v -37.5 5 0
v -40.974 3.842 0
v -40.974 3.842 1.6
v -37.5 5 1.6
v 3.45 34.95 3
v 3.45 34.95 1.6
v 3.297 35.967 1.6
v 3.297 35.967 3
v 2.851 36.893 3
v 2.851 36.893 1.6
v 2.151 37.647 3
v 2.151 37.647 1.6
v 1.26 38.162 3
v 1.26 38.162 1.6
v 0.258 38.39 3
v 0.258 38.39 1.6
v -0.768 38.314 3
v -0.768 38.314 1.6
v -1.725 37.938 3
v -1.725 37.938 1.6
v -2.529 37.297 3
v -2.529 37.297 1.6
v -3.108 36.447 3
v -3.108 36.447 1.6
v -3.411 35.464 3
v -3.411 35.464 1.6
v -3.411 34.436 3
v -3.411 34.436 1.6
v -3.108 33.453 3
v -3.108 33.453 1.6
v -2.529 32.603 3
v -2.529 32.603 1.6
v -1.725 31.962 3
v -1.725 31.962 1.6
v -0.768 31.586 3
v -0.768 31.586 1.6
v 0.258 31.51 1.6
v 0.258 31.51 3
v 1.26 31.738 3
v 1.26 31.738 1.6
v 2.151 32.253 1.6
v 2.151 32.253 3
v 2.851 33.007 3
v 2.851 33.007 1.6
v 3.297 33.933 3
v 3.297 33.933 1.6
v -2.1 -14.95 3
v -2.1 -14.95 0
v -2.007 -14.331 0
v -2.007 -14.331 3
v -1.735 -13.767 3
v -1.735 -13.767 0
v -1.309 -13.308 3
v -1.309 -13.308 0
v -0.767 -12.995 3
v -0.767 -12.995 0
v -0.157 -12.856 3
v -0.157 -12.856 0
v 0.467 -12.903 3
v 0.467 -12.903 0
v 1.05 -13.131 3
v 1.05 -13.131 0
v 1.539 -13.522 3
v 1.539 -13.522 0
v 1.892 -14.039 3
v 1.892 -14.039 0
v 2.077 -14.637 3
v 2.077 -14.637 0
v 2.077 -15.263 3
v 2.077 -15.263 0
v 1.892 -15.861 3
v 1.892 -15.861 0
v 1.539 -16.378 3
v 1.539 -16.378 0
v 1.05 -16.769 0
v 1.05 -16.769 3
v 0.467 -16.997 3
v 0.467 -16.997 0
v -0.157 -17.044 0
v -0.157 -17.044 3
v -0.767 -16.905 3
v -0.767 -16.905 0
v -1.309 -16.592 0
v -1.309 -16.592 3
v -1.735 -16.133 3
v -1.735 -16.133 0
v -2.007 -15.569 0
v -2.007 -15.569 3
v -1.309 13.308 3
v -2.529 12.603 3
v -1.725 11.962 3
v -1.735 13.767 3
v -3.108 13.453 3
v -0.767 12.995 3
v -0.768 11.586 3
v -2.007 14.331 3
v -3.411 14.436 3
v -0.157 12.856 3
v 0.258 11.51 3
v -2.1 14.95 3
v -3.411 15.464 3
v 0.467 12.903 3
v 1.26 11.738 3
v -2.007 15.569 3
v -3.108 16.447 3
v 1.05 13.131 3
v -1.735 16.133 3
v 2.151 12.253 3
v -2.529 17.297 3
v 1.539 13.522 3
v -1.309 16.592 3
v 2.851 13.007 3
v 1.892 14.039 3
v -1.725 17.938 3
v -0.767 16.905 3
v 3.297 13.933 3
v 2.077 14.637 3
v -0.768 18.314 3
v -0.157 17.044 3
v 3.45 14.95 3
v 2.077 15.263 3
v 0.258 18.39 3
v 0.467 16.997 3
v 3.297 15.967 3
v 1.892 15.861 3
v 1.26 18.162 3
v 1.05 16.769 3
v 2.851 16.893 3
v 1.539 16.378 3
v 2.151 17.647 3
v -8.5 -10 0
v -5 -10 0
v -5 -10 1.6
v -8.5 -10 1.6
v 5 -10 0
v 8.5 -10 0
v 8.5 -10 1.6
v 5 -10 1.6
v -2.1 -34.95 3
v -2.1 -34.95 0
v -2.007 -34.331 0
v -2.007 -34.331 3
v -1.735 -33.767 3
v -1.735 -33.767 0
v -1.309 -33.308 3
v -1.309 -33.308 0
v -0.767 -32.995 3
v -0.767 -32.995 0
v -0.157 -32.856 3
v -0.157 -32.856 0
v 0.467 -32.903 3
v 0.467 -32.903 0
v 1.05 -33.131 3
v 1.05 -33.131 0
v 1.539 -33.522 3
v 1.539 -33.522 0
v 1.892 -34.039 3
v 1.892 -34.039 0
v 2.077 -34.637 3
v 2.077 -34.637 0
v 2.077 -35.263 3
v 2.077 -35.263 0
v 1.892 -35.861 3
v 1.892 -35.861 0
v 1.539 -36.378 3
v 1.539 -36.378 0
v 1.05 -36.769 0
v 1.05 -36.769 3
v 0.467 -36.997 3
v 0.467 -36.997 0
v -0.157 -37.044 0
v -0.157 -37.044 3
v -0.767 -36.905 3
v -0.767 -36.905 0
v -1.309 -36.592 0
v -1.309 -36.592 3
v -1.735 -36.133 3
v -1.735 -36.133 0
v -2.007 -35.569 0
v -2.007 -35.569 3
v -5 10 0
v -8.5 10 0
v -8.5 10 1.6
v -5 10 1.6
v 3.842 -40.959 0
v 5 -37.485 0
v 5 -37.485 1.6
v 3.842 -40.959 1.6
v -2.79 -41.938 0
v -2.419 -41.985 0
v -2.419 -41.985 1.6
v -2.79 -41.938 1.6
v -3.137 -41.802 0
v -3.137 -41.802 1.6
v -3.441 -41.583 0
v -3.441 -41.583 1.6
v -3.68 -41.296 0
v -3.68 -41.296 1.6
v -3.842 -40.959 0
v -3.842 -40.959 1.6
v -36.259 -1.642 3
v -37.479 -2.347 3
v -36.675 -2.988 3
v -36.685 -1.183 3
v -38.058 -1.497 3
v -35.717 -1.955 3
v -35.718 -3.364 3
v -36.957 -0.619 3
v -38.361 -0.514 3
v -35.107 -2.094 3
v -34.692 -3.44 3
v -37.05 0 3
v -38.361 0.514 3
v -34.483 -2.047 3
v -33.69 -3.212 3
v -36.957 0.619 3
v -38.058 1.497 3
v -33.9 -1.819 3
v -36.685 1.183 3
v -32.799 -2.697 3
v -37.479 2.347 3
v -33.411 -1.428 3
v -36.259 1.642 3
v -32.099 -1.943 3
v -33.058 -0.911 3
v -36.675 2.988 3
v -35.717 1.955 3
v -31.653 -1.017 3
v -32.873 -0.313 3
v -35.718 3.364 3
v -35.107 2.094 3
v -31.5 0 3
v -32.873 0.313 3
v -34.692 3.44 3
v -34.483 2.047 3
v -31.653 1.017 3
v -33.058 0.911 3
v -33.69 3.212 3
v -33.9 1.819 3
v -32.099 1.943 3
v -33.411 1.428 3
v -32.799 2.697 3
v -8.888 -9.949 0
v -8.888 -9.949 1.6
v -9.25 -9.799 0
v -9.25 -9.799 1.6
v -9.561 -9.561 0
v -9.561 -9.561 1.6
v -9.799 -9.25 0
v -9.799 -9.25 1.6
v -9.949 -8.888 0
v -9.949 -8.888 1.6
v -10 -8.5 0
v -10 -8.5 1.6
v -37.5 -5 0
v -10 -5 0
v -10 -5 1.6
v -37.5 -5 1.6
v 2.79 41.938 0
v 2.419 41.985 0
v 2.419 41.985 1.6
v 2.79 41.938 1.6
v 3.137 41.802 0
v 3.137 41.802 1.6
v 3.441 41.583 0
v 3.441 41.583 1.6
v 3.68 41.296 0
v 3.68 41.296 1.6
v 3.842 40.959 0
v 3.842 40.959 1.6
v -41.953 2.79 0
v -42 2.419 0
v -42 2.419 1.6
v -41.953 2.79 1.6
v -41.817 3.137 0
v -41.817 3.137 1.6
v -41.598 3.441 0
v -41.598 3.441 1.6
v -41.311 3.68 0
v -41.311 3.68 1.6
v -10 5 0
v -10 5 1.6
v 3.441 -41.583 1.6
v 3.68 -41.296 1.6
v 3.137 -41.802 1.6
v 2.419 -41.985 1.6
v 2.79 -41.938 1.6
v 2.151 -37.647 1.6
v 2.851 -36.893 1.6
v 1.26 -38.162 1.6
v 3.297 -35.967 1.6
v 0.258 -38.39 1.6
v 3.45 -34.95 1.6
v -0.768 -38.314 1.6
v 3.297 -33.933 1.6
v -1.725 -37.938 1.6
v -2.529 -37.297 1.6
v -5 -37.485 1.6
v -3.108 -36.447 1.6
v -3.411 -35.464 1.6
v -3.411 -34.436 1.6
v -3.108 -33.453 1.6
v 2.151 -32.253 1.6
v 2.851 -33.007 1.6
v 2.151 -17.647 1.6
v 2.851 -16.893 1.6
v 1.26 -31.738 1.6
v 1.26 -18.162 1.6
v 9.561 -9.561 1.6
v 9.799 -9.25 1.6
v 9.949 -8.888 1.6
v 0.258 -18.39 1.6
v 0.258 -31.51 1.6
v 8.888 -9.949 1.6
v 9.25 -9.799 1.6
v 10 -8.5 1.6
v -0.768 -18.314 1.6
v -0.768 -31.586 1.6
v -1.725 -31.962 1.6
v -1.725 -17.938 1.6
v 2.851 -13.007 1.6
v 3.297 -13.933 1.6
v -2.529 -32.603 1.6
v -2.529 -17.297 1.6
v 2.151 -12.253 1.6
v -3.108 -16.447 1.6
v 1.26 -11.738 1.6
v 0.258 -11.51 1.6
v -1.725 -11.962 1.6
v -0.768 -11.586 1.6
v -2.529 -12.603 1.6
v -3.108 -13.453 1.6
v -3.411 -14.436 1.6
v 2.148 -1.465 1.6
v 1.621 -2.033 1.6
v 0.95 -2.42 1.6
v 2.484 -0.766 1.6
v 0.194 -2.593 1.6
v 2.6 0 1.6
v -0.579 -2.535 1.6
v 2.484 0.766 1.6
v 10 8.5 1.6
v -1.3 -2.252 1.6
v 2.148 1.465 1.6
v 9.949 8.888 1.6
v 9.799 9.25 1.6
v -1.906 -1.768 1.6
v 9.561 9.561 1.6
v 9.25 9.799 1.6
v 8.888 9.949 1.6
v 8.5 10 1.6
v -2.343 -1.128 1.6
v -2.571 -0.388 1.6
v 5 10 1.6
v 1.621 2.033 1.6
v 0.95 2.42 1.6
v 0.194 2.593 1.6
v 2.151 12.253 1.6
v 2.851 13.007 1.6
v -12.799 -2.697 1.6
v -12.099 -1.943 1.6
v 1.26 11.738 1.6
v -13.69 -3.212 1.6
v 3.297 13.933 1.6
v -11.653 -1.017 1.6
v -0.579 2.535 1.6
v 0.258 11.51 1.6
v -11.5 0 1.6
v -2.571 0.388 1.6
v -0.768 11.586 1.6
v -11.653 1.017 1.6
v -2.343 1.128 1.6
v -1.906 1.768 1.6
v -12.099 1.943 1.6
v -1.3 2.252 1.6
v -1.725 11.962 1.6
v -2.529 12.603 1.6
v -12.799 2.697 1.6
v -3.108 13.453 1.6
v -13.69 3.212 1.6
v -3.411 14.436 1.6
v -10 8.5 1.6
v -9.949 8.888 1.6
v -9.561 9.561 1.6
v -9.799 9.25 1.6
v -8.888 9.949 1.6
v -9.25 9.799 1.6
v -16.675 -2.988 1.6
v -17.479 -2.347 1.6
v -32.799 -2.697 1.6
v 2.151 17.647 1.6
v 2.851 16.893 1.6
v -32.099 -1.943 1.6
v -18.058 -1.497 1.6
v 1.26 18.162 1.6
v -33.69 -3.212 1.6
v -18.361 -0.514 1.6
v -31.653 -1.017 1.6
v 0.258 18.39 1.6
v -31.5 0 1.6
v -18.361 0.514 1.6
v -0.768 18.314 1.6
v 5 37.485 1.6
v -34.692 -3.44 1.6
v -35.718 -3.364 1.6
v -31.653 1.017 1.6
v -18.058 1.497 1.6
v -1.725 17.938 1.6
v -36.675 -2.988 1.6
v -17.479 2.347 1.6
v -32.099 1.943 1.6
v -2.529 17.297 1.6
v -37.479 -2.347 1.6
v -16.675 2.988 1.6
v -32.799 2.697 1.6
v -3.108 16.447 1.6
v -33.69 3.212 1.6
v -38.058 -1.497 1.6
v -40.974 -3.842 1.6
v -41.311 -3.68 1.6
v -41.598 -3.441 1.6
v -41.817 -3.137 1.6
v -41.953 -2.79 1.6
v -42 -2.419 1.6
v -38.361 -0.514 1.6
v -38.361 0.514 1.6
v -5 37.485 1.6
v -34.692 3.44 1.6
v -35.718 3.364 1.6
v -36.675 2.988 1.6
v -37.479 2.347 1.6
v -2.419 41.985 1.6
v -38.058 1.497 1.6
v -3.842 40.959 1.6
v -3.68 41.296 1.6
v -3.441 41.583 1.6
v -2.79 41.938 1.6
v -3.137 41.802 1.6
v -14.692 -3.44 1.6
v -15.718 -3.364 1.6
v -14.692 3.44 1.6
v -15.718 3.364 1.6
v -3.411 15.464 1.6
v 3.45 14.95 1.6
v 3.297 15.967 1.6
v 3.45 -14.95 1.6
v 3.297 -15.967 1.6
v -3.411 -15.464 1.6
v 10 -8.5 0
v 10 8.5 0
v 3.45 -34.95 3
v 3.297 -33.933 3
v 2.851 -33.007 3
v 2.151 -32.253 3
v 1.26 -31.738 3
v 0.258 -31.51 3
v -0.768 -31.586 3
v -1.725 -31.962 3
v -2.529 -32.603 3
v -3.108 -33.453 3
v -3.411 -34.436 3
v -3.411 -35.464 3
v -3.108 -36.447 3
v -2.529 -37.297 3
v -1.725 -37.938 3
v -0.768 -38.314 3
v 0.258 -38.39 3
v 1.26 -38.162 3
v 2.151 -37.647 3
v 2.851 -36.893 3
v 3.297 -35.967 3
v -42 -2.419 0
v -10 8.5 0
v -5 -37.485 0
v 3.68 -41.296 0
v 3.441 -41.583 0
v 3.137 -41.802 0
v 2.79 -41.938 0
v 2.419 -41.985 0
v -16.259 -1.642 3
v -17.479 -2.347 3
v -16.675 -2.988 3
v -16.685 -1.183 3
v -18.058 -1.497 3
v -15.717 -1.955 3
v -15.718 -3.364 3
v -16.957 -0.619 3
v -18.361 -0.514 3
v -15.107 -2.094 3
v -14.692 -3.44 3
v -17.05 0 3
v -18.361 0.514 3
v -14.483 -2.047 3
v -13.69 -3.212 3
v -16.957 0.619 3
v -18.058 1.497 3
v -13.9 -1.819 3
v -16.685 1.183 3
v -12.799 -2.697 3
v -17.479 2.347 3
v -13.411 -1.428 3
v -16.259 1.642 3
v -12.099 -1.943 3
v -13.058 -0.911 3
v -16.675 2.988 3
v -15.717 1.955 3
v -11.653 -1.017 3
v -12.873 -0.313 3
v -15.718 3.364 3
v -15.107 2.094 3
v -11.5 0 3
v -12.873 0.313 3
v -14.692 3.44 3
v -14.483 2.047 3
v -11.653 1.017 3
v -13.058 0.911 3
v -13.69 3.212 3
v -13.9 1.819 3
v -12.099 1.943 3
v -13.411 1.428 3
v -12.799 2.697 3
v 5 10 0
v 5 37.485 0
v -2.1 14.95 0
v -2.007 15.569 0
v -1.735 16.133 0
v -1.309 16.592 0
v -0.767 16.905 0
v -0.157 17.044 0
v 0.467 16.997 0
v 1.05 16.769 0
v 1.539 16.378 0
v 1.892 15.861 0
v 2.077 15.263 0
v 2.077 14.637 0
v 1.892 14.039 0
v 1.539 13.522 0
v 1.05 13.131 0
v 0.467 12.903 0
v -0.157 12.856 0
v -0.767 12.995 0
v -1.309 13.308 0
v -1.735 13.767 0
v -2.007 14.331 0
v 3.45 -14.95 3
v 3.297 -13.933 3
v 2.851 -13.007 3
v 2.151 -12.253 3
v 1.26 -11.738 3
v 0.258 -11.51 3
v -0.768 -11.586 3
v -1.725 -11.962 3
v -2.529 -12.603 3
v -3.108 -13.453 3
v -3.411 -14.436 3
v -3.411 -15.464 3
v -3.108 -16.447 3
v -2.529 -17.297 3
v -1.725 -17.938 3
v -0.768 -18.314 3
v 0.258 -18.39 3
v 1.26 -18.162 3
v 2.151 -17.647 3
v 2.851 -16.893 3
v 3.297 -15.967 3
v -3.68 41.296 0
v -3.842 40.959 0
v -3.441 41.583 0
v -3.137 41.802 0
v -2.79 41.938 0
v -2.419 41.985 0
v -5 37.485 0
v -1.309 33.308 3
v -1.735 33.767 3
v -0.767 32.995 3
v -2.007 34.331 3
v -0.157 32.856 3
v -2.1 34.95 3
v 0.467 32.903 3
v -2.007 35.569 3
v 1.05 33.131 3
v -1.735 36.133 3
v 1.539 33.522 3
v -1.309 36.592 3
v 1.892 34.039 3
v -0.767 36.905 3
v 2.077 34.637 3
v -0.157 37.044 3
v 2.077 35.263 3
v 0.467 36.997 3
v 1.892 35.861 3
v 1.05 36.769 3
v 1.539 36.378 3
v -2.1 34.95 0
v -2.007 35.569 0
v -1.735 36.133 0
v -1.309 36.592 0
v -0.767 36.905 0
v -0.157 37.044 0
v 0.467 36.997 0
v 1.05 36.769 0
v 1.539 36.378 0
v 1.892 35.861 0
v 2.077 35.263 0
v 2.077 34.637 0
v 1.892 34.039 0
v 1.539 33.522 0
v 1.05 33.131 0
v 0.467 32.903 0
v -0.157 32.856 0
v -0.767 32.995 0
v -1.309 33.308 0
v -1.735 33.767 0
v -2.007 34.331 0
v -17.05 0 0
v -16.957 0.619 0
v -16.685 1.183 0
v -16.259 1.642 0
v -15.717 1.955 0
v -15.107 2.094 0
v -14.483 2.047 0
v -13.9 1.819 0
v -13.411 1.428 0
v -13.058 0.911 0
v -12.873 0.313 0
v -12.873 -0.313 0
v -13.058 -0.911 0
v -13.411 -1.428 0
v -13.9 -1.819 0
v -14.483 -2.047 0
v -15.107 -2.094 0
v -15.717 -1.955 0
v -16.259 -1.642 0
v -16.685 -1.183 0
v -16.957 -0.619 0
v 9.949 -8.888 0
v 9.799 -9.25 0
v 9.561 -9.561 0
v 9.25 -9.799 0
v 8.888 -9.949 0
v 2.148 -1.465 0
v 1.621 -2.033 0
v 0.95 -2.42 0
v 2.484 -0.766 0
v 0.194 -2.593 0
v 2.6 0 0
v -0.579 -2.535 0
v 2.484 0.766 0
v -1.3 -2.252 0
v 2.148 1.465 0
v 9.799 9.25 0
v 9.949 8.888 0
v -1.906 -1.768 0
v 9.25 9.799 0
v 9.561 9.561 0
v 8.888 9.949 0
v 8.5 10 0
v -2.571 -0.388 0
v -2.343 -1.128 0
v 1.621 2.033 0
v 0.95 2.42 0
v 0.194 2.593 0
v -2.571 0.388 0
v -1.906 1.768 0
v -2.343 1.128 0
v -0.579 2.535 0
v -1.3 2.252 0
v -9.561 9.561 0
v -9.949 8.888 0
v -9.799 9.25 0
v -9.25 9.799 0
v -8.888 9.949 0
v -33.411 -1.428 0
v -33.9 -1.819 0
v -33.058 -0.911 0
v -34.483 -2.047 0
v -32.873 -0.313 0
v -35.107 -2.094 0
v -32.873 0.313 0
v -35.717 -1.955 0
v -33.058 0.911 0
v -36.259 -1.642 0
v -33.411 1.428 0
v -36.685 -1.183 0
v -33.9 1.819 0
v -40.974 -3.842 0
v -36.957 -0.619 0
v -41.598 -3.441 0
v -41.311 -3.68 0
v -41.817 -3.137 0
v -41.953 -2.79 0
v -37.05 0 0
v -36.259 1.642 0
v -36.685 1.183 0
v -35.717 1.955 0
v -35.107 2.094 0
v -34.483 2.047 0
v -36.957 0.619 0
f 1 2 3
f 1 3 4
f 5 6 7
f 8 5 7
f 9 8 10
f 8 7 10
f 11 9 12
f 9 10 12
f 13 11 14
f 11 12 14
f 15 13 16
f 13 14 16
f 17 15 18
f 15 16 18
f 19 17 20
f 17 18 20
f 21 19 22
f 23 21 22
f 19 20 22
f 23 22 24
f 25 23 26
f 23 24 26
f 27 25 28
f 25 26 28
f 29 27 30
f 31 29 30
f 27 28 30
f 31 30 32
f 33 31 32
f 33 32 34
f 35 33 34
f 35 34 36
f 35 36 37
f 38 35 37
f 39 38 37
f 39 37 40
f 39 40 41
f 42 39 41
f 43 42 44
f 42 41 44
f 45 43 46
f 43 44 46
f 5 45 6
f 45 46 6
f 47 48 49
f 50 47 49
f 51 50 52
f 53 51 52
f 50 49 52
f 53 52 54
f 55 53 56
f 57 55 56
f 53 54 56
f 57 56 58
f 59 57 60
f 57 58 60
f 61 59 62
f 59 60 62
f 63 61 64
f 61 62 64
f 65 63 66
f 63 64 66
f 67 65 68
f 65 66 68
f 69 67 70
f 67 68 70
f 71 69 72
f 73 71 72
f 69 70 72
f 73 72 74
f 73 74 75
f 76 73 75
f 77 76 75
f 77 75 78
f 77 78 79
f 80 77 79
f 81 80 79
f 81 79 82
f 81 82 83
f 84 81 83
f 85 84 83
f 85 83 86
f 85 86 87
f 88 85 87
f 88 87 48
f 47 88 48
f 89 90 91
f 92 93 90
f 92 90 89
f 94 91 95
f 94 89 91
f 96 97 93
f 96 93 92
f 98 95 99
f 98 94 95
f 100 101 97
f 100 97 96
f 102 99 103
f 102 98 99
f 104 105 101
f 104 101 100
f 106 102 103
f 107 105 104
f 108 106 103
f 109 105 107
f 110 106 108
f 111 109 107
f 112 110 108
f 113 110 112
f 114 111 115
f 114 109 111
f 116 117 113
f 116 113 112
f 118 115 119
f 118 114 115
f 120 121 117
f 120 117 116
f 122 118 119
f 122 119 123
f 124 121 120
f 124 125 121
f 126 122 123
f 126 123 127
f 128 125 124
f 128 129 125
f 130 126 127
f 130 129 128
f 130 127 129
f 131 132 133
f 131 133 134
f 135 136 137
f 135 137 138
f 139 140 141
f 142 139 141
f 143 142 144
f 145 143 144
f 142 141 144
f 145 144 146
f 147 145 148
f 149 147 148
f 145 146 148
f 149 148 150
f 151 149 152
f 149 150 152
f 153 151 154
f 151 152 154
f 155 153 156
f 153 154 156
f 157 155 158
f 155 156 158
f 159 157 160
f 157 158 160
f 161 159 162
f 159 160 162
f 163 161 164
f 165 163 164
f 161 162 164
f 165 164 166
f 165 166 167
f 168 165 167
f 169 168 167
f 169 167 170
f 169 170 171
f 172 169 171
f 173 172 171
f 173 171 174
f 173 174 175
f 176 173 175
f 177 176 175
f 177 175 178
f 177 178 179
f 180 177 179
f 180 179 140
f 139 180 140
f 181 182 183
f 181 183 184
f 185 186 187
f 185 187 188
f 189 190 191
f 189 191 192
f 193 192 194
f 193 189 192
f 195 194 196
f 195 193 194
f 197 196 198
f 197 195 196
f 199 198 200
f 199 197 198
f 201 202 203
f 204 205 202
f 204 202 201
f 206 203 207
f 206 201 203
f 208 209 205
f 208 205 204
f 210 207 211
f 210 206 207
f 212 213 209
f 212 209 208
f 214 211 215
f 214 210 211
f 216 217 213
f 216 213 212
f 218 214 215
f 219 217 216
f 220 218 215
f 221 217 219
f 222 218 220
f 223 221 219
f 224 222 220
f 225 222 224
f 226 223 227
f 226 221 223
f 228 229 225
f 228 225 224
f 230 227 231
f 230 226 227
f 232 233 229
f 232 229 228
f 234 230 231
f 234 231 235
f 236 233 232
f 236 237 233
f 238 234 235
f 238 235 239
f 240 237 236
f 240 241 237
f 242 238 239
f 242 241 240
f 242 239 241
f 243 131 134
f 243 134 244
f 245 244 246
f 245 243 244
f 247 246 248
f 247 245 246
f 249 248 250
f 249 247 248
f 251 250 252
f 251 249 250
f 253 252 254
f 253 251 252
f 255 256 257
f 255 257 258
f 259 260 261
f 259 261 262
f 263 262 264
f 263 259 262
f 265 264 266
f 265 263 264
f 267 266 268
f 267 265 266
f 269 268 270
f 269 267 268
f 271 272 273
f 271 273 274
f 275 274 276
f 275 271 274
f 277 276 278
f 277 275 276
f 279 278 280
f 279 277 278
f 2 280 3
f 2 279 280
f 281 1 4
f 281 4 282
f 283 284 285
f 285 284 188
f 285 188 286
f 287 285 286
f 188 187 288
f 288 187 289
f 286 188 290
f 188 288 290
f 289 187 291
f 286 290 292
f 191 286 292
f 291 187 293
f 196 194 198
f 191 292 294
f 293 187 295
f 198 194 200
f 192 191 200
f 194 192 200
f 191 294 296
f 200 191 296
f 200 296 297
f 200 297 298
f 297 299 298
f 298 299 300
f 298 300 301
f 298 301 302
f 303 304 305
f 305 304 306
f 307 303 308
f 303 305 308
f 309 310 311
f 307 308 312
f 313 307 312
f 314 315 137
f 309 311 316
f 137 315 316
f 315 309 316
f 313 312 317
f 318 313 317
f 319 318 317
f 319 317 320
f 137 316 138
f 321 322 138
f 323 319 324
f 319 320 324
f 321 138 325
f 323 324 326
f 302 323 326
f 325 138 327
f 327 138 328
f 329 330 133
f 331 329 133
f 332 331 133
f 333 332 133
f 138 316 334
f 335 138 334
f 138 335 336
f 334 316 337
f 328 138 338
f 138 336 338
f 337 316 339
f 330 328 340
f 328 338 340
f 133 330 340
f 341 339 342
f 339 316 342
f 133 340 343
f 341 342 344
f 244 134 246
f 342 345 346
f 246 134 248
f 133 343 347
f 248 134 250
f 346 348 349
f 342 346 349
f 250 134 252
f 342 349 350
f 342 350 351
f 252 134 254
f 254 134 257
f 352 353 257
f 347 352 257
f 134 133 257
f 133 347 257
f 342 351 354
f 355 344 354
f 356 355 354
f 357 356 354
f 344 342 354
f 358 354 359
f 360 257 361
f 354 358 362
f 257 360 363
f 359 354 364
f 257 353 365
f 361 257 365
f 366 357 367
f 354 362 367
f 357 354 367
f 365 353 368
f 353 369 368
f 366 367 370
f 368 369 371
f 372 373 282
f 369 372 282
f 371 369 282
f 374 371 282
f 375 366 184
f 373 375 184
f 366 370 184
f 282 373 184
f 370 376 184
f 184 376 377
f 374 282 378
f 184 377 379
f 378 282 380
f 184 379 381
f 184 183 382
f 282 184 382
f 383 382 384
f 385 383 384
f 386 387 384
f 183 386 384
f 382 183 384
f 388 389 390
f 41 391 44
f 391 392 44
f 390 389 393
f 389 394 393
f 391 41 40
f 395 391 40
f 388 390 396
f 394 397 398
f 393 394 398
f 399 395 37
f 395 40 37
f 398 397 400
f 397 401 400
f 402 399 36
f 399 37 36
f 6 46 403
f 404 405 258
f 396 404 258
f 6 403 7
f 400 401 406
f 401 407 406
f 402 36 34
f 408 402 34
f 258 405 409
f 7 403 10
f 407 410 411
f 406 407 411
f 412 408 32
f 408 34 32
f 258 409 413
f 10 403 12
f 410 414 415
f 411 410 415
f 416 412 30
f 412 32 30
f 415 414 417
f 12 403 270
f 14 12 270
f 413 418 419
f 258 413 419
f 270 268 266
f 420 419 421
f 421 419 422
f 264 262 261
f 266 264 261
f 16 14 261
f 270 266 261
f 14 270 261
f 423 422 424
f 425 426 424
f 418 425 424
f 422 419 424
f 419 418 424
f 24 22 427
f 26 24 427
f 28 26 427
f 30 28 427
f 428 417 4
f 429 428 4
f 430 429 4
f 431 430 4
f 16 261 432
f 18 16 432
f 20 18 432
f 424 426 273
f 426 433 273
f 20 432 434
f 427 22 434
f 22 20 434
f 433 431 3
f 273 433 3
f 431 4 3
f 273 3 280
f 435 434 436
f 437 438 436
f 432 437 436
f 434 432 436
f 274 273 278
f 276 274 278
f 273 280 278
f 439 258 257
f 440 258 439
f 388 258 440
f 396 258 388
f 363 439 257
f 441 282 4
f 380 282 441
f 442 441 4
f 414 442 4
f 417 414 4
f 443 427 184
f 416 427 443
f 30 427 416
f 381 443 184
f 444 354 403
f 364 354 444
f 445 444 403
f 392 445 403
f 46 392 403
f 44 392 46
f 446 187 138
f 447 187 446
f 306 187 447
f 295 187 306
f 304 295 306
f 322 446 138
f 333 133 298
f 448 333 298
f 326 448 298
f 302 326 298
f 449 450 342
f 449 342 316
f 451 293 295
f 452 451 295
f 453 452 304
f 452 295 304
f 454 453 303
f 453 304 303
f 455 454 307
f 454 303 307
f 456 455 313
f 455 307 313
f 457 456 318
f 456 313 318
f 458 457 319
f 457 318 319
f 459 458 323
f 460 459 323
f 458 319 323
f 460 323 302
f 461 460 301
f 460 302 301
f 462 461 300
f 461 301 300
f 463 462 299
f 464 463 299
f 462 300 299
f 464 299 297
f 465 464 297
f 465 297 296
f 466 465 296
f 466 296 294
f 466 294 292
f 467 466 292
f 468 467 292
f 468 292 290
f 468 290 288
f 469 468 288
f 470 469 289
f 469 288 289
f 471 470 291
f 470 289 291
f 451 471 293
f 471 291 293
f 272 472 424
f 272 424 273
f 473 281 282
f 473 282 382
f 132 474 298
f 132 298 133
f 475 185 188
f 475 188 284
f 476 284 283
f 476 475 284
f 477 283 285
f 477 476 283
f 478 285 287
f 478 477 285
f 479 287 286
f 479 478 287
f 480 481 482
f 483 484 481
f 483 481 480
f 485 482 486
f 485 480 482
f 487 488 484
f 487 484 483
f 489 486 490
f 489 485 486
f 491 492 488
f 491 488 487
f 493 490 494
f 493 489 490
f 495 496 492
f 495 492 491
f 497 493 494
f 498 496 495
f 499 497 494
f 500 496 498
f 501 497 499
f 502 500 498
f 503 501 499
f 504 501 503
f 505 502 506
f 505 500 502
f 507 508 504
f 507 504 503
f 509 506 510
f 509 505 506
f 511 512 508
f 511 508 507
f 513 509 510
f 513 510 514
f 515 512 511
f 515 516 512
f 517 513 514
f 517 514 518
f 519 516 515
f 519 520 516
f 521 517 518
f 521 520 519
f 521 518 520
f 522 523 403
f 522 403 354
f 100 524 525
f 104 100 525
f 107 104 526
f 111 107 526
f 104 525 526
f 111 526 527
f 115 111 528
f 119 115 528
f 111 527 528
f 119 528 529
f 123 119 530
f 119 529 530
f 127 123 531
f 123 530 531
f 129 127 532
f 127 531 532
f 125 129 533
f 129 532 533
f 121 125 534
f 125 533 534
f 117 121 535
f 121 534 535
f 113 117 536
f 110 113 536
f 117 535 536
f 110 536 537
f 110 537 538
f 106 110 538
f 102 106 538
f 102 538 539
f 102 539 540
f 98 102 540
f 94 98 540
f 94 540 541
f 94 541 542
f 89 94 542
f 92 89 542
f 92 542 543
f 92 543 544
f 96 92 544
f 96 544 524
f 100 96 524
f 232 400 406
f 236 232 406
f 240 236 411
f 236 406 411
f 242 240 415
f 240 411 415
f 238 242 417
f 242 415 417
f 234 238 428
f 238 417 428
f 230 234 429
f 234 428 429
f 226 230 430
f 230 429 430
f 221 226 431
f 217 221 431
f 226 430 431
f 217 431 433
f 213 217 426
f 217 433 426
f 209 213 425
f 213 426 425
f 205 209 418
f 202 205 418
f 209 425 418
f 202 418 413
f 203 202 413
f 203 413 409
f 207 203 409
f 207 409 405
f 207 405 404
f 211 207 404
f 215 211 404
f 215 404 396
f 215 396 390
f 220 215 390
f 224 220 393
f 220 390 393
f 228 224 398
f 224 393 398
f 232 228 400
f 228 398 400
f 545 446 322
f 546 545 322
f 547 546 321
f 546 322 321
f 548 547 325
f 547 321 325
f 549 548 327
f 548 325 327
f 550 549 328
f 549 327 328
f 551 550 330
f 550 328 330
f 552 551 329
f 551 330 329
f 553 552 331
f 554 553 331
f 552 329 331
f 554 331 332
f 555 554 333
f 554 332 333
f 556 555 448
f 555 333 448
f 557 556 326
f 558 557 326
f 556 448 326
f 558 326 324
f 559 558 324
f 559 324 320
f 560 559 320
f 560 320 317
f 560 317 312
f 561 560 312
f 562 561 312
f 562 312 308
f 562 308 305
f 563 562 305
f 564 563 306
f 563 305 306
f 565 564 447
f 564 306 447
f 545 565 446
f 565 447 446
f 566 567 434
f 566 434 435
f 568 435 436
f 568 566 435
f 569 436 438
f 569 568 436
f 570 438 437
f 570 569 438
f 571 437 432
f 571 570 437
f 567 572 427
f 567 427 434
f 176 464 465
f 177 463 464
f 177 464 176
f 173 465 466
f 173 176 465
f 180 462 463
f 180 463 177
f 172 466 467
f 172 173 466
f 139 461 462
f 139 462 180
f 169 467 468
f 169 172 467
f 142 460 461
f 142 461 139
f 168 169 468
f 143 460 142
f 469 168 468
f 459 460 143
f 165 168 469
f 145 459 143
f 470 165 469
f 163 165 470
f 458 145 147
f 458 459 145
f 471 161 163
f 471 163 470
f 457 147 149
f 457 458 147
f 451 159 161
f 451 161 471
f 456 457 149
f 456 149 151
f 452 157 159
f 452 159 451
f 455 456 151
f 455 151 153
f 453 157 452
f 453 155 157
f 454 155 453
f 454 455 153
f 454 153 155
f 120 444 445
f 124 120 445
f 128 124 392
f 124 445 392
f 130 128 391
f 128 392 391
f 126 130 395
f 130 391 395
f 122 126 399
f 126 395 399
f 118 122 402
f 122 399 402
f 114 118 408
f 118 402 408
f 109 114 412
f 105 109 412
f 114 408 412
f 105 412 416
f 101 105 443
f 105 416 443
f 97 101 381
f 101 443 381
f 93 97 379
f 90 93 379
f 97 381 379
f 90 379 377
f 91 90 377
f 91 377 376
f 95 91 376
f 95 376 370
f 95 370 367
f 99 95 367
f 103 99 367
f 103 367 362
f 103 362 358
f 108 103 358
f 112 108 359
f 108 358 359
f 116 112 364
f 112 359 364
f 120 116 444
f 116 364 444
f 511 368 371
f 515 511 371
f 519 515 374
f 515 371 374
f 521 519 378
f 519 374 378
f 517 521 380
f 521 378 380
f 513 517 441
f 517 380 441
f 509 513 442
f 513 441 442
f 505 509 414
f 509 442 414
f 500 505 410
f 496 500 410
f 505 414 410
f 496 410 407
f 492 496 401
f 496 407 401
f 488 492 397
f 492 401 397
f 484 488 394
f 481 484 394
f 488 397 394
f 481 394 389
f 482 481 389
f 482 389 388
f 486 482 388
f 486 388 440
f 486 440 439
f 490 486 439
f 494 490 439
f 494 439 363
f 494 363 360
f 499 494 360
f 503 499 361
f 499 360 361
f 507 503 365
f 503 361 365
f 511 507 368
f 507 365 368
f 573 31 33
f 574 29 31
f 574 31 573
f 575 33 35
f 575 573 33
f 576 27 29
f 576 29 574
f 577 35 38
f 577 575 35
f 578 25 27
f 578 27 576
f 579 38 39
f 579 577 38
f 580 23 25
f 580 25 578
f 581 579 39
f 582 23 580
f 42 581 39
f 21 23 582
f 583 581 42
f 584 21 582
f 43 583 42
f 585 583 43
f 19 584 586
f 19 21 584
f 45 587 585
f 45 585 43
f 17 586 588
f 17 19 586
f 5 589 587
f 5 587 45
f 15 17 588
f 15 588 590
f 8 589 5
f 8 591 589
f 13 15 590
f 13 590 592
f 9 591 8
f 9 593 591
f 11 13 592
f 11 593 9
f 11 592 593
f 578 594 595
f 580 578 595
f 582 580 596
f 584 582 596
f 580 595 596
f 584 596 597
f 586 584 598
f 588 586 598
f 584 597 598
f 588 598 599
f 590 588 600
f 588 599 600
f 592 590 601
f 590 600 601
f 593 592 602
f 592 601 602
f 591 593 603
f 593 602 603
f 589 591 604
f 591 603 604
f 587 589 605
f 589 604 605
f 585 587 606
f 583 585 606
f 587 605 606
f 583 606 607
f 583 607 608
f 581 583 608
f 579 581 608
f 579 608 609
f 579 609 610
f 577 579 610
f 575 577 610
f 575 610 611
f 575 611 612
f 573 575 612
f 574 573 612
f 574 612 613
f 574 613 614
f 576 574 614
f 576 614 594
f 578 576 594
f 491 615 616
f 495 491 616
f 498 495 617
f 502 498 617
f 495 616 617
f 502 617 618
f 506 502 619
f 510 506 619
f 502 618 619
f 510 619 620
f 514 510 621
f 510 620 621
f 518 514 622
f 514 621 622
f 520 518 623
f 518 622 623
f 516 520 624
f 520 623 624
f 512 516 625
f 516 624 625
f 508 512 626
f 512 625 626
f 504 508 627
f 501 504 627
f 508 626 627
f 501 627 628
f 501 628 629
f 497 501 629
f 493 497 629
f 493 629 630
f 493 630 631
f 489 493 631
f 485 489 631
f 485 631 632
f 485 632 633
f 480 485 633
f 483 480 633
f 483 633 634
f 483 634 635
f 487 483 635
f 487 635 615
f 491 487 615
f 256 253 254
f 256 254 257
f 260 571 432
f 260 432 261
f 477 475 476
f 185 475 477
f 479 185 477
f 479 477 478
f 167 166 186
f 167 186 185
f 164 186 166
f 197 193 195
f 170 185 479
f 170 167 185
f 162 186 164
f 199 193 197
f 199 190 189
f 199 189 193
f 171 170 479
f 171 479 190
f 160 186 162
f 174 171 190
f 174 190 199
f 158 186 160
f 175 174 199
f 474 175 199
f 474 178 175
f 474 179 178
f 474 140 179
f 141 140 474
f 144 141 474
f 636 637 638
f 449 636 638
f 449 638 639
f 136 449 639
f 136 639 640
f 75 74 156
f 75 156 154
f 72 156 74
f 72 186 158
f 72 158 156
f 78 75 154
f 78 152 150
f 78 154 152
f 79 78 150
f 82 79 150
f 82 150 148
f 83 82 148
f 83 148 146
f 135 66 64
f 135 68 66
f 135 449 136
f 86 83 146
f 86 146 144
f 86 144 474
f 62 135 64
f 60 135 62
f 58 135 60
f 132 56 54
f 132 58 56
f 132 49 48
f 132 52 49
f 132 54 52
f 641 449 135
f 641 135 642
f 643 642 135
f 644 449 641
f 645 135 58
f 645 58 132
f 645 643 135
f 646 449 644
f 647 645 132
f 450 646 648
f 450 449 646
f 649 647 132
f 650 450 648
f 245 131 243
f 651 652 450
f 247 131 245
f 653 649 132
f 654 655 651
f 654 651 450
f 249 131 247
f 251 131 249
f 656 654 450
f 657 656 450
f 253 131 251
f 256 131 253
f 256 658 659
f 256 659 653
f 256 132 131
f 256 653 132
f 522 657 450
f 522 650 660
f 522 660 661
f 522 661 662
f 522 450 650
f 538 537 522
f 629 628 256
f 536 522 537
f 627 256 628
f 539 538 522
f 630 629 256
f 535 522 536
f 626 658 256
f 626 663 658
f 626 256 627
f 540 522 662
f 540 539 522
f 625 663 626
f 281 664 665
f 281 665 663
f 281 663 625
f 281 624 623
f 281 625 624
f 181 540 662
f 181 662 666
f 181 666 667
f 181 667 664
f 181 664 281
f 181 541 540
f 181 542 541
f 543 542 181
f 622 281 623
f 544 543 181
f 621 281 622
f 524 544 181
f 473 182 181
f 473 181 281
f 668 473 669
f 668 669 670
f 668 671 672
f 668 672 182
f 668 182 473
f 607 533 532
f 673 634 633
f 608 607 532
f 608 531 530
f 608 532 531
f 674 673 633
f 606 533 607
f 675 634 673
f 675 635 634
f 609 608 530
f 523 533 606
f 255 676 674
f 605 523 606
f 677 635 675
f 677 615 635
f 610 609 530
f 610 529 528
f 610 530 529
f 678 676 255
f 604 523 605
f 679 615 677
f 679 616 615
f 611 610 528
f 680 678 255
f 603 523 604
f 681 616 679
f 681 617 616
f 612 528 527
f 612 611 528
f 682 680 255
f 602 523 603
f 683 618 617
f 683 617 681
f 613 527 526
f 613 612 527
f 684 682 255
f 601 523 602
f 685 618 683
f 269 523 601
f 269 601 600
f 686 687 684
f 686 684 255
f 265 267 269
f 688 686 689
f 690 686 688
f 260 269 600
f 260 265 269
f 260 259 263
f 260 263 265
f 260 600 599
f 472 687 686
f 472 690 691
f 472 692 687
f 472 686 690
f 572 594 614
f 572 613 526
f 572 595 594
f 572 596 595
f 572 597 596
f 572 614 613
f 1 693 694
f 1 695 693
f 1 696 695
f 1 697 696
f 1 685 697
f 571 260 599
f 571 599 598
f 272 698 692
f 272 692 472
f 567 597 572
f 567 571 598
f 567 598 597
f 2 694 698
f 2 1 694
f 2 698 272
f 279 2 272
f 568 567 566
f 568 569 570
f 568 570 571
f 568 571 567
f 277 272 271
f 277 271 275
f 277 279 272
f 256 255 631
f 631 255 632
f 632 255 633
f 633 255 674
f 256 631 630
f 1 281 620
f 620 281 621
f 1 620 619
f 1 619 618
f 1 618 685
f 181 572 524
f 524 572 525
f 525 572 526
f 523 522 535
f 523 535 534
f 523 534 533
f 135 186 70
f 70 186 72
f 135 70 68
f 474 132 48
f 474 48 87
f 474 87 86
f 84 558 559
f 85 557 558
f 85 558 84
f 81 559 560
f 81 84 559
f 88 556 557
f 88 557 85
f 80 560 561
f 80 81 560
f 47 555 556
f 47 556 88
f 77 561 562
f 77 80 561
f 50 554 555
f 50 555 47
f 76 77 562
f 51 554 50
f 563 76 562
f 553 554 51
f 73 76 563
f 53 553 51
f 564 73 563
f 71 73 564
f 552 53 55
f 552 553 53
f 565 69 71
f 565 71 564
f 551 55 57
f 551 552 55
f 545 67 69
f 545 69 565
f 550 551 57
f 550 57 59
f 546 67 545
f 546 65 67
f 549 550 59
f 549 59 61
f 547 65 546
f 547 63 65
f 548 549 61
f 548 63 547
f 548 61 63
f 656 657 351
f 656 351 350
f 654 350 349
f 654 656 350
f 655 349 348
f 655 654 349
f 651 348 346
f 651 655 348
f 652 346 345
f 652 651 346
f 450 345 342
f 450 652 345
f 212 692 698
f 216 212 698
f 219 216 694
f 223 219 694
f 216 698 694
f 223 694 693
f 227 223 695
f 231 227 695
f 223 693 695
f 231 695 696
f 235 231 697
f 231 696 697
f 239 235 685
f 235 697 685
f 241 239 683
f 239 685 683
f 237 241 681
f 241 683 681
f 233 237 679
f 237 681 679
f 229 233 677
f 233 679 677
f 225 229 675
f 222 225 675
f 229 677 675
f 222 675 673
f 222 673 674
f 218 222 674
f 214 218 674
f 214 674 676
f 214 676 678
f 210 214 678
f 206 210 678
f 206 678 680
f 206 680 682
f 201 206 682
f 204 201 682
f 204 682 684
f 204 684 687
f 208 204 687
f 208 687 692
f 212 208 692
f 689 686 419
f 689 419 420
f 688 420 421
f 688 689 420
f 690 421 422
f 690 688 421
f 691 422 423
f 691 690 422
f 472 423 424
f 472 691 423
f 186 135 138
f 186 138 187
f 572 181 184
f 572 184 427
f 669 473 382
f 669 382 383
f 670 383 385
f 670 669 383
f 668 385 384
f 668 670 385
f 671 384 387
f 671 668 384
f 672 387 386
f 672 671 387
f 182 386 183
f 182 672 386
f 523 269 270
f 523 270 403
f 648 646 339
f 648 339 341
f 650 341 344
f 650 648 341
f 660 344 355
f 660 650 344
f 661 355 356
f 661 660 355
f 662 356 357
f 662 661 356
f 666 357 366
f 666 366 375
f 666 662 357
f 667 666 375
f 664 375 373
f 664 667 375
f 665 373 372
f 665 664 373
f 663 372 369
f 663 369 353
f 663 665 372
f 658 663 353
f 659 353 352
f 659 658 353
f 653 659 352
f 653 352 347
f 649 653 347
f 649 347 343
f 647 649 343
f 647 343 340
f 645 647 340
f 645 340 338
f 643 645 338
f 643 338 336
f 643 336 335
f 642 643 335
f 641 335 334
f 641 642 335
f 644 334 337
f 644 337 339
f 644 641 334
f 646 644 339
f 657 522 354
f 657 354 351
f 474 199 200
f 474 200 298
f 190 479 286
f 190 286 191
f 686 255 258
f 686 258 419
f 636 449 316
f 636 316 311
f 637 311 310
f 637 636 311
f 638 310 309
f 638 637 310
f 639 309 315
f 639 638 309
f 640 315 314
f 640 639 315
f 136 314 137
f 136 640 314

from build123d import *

# Parameters (mm, degrees)
SKETCH1_R             = 2.6
BOSS_EXTRUDE1_DEPTH   = 1.6
SKETCH2_R             = 3.45
BOSS_EXTRUDE2_DEPTH   = 1.4
M5X0_8_TAPPED_HOLE1_D = 4.2


with BuildPart() as part:
    # Sketch1 → Boss-Extrude1 (new body)
    with BuildSketch(Plane.XY):
        with BuildLine():
            Line((-10, -8.5), (-10, -5))
            Line((-10, -5), (-37.5, -5))
            Line((-37.5, -5), (-40.974341649, -3.841886117))
            ThreePointArc((-40.974341649, -3.841886117), (-41.716863278, -3.295926597), (-42, -2.41886117))
            Line((-42, -2.41886117), (-42, 2.41886117))
            ThreePointArc((-42, 2.41886117), (-41.716863278, 3.295926597), (-40.974341649, 3.841886117))
            Line((-40.974341649, 3.841886117), (-37.5, 5))
            Line((-37.5, 5), (-10, 5))
            Line((-10, 5), (-10, 8.5))
            ThreePointArc((-10, 8.5), (-9.560660172, 9.560660172), (-8.5, 10))
            Line((-8.5, 10), (-5, 10))
            Line((-5, 10), (-5, 37.485))
            Line((-5, 37.485), (-3.841886117, 40.959341649))
            ThreePointArc((-3.841886117, 40.959341649), (-3.295926597, 41.701863278), (-2.41886117, 41.985))
            Line((-2.41886117, 41.985), (2.41886117, 41.985))
            ThreePointArc((2.41886117, 41.985), (3.295926597, 41.701863278), (3.841886117, 40.959341649))
            Line((3.841886117, 40.959341649), (5, 37.485))
            Line((5, 37.485), (5, 10))
            Line((5, 10), (8.5, 10))
            ThreePointArc((8.5, 10), (9.560660172, 9.560660172), (10, 8.5))
            Line((10, 8.5), (10, -8.5))
            ThreePointArc((10, -8.5), (9.560660172, -9.560660172), (8.5, -10))
            Line((8.5, -10), (5, -10))
            Line((5, -10), (5, -37.485))
            Line((5, -37.485), (3.841886117, -40.959341649))
            ThreePointArc((3.841886117, -40.959341649), (3.295926597, -41.701863278), (2.41886117, -41.985))
            Line((2.41886117, -41.985), (-2.41886117, -41.985))
            ThreePointArc((-2.41886117, -41.985), (-3.295926597, -41.701863278), (-3.841886117, -40.959341649))
            Line((-3.841886117, -40.959341649), (-5, -37.485))
            Line((-5, -37.485), (-5, -10))
            Line((-5, -10), (-8.5, -10))
            ThreePointArc((-8.5, -10), (-9.560660172, -9.560660172), (-10, -8.5))
        make_face()
        Circle(SKETCH1_R, mode=Mode.SUBTRACT)
    extrude(amount=BOSS_EXTRUDE1_DEPTH)

    # Sketch2 → Boss-Extrude2 (add)
    with BuildSketch(Plane.XY.offset(1.6)):
        with Locations((0, 14.95)):
            Circle(SKETCH2_R)
        with Locations((0, 34.95)):
            Circle(SKETCH2_R)
        with Locations((0, -14.95)):
            Circle(SKETCH2_R)
        with Locations((0, -34.95)):
            Circle(SKETCH2_R)
        with Locations((-14.95, 0)):
            Circle(SKETCH2_R)
        with Locations((-34.95, 0)):
            Circle(SKETCH2_R)
    extrude(amount=BOSS_EXTRUDE2_DEPTH)

    # M5x0.8 Tapped Hole1 (through all)
    with Locations(Plane.XY.offset(3)):
        with Locations((0, 34.95), (0, 14.95), (0, -14.95), (0, -34.95), (-14.95, 0), (-34.95, 0)):
            Hole(M5X0_8_TAPPED_HOLE1_D / 2)


solid = part.part
